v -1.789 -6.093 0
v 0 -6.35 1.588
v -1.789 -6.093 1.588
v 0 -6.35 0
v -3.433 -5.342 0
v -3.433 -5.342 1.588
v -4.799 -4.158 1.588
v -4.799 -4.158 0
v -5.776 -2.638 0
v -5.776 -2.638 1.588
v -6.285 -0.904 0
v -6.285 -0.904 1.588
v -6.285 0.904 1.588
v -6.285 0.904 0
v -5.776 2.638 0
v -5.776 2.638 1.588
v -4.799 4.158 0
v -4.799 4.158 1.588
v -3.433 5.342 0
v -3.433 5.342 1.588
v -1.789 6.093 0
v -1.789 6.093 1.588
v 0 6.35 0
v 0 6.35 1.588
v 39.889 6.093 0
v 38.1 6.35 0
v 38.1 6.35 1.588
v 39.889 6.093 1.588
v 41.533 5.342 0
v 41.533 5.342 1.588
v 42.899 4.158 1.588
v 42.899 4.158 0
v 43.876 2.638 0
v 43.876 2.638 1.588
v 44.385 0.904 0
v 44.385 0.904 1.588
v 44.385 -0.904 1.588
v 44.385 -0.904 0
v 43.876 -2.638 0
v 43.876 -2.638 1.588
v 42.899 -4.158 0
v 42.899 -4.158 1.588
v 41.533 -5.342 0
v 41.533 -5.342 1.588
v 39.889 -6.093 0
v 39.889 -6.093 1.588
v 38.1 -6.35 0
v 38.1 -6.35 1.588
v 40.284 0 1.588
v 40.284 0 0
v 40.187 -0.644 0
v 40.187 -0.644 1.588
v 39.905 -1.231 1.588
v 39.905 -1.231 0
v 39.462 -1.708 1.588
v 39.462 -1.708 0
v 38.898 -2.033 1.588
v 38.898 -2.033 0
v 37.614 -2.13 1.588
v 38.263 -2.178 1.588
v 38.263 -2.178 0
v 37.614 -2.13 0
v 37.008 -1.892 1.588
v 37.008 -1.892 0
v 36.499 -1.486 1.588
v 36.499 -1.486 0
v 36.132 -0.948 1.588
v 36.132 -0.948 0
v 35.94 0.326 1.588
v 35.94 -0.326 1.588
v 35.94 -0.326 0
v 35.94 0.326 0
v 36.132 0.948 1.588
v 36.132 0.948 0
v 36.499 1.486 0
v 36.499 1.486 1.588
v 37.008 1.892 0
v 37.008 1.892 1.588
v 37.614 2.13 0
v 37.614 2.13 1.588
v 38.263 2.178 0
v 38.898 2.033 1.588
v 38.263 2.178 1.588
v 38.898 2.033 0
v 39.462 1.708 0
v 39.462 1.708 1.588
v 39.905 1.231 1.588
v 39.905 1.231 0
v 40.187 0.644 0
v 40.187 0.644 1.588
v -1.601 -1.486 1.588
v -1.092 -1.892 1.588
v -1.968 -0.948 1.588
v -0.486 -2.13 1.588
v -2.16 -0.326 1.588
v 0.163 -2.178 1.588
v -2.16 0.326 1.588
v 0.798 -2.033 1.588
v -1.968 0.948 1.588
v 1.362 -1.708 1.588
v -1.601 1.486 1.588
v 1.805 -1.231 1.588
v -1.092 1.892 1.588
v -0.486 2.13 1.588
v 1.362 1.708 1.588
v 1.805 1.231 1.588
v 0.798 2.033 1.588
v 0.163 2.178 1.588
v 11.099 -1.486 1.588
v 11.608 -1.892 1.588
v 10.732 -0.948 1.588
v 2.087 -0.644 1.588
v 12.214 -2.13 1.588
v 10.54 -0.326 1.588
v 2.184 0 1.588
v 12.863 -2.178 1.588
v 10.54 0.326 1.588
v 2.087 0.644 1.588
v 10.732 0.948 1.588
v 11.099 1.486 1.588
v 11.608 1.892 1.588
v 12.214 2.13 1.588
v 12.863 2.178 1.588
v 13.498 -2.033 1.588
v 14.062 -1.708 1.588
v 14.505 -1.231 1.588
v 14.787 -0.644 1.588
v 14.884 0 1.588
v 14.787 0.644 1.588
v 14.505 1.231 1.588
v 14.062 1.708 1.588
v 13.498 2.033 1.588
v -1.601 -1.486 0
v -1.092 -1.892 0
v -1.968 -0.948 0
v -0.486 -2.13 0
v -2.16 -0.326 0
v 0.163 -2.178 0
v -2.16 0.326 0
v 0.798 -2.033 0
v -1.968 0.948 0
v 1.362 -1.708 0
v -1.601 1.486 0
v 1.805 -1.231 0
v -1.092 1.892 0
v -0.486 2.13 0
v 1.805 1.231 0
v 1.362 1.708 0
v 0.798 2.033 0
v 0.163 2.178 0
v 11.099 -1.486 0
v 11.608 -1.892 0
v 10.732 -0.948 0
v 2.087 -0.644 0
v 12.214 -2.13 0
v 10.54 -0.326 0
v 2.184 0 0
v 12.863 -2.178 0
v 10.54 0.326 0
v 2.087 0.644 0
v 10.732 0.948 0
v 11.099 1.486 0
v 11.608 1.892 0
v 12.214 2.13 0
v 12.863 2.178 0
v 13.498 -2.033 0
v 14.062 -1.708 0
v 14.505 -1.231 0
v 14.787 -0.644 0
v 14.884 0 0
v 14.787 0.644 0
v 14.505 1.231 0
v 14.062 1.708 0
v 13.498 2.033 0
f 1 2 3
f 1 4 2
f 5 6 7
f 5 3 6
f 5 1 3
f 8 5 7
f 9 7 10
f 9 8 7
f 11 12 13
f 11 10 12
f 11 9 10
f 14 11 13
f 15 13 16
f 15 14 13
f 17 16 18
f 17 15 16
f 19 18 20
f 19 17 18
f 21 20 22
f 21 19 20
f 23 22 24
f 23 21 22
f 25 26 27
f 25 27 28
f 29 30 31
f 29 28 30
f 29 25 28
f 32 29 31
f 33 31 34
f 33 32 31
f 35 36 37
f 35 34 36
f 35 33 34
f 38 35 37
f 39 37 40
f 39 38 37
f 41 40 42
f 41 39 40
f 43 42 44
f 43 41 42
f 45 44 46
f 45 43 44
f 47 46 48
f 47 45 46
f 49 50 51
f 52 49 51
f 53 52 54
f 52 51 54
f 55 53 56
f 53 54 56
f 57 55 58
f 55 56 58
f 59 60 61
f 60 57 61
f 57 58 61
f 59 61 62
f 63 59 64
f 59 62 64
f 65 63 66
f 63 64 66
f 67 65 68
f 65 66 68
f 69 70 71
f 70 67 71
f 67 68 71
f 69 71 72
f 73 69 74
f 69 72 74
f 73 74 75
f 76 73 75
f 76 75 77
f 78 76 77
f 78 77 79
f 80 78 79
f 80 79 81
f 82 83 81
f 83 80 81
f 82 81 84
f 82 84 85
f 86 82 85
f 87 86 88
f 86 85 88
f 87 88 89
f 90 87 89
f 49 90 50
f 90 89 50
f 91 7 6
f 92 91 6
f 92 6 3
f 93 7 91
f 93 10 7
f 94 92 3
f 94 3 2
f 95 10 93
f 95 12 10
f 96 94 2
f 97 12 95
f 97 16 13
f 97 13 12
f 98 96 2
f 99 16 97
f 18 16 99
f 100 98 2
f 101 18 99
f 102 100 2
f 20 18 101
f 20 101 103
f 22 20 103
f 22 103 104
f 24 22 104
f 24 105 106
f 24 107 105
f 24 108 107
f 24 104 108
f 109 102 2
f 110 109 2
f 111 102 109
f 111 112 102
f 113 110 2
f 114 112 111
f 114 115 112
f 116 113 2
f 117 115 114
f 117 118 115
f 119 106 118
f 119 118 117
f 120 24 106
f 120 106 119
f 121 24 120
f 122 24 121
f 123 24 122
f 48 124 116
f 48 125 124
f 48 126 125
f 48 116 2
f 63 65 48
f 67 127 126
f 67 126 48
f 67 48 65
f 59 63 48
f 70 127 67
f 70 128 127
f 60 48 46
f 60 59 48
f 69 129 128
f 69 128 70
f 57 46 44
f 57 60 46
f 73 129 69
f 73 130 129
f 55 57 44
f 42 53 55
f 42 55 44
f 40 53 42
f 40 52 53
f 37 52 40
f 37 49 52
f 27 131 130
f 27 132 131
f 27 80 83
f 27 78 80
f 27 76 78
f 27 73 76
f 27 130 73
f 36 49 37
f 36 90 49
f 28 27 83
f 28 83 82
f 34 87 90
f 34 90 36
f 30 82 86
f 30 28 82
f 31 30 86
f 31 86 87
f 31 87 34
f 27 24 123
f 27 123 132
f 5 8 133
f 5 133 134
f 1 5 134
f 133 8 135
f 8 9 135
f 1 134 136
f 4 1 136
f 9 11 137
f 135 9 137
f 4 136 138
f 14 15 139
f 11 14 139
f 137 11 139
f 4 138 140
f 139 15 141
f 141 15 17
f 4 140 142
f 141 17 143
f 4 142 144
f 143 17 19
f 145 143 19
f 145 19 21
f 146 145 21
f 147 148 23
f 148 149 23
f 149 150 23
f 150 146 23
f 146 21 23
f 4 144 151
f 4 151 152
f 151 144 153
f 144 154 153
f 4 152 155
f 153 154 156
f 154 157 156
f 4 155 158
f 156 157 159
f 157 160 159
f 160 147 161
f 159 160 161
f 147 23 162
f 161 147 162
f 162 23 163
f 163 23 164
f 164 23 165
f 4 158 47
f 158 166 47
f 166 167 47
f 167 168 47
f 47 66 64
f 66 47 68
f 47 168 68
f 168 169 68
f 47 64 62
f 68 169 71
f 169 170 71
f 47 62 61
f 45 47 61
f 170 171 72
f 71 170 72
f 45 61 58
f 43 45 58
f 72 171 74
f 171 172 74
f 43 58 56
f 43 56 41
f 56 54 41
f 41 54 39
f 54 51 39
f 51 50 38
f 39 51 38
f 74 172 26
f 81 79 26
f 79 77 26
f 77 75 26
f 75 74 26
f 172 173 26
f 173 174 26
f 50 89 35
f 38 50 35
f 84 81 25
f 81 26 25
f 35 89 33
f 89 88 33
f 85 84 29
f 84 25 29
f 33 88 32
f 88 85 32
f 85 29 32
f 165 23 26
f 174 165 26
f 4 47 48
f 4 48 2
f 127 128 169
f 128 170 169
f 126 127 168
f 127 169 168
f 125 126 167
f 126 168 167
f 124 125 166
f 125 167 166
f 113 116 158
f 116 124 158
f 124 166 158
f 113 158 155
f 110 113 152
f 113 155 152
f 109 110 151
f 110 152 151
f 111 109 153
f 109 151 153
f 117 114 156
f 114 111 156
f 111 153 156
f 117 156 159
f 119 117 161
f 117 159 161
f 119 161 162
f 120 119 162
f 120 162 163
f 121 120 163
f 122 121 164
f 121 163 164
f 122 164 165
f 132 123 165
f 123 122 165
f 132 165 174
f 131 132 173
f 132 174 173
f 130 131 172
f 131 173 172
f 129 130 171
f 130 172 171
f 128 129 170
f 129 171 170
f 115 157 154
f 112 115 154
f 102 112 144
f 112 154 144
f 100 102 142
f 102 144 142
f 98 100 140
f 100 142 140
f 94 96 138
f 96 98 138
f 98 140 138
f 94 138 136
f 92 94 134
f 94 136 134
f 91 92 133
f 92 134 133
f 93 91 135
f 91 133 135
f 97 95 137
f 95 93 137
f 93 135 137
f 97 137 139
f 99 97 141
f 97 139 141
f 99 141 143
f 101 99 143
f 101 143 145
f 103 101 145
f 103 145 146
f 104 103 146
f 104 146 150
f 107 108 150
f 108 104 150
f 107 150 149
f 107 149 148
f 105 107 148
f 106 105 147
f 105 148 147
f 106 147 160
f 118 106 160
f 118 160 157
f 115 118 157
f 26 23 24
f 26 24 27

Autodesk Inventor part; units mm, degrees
ref_plane "YZ Plane" through (0, 0, 0) normal (1, 0, 0) x (0, 1, 0)
ref_plane "XZ Plane" through (0, 0, 0) normal (0, 1, 0) x (-1, 0, 0)
ref_plane "XY Plane" through (0, 0, 0) normal (0, 0, 1) x (1, 0, 0)
sketch "Sketch1" plane through (0, 0, 0) normal (0, 0, 1) x (1, 0, 0)
  circle A0 centre (0, 0) radius 2.1844
  circle A1 centre (38.1, 0) radius 2.1844
  line L0 (0, 6.35) -> (38.1, 6.35)
  line L1 (38.1, -6.35) -> (0, -6.35)
  arc A2 (0, 6.35) -> (0, -6.35) centre (0, 0) ccw
  arc A3 (38.1, -6.35) -> (38.1, 6.35) centre (38.1, 0) ccw
  circle A4 centre (12.7, 0) radius 2.1844
  dimension "d0" = 4.3688
  dimension "d2" = 4.3688
  dimension "d8" = 4.3688
extrude "Extrusion1" add sketch "Sketch1" along normal blind 1.5875
properties part number "distancesensorcablemanage"
